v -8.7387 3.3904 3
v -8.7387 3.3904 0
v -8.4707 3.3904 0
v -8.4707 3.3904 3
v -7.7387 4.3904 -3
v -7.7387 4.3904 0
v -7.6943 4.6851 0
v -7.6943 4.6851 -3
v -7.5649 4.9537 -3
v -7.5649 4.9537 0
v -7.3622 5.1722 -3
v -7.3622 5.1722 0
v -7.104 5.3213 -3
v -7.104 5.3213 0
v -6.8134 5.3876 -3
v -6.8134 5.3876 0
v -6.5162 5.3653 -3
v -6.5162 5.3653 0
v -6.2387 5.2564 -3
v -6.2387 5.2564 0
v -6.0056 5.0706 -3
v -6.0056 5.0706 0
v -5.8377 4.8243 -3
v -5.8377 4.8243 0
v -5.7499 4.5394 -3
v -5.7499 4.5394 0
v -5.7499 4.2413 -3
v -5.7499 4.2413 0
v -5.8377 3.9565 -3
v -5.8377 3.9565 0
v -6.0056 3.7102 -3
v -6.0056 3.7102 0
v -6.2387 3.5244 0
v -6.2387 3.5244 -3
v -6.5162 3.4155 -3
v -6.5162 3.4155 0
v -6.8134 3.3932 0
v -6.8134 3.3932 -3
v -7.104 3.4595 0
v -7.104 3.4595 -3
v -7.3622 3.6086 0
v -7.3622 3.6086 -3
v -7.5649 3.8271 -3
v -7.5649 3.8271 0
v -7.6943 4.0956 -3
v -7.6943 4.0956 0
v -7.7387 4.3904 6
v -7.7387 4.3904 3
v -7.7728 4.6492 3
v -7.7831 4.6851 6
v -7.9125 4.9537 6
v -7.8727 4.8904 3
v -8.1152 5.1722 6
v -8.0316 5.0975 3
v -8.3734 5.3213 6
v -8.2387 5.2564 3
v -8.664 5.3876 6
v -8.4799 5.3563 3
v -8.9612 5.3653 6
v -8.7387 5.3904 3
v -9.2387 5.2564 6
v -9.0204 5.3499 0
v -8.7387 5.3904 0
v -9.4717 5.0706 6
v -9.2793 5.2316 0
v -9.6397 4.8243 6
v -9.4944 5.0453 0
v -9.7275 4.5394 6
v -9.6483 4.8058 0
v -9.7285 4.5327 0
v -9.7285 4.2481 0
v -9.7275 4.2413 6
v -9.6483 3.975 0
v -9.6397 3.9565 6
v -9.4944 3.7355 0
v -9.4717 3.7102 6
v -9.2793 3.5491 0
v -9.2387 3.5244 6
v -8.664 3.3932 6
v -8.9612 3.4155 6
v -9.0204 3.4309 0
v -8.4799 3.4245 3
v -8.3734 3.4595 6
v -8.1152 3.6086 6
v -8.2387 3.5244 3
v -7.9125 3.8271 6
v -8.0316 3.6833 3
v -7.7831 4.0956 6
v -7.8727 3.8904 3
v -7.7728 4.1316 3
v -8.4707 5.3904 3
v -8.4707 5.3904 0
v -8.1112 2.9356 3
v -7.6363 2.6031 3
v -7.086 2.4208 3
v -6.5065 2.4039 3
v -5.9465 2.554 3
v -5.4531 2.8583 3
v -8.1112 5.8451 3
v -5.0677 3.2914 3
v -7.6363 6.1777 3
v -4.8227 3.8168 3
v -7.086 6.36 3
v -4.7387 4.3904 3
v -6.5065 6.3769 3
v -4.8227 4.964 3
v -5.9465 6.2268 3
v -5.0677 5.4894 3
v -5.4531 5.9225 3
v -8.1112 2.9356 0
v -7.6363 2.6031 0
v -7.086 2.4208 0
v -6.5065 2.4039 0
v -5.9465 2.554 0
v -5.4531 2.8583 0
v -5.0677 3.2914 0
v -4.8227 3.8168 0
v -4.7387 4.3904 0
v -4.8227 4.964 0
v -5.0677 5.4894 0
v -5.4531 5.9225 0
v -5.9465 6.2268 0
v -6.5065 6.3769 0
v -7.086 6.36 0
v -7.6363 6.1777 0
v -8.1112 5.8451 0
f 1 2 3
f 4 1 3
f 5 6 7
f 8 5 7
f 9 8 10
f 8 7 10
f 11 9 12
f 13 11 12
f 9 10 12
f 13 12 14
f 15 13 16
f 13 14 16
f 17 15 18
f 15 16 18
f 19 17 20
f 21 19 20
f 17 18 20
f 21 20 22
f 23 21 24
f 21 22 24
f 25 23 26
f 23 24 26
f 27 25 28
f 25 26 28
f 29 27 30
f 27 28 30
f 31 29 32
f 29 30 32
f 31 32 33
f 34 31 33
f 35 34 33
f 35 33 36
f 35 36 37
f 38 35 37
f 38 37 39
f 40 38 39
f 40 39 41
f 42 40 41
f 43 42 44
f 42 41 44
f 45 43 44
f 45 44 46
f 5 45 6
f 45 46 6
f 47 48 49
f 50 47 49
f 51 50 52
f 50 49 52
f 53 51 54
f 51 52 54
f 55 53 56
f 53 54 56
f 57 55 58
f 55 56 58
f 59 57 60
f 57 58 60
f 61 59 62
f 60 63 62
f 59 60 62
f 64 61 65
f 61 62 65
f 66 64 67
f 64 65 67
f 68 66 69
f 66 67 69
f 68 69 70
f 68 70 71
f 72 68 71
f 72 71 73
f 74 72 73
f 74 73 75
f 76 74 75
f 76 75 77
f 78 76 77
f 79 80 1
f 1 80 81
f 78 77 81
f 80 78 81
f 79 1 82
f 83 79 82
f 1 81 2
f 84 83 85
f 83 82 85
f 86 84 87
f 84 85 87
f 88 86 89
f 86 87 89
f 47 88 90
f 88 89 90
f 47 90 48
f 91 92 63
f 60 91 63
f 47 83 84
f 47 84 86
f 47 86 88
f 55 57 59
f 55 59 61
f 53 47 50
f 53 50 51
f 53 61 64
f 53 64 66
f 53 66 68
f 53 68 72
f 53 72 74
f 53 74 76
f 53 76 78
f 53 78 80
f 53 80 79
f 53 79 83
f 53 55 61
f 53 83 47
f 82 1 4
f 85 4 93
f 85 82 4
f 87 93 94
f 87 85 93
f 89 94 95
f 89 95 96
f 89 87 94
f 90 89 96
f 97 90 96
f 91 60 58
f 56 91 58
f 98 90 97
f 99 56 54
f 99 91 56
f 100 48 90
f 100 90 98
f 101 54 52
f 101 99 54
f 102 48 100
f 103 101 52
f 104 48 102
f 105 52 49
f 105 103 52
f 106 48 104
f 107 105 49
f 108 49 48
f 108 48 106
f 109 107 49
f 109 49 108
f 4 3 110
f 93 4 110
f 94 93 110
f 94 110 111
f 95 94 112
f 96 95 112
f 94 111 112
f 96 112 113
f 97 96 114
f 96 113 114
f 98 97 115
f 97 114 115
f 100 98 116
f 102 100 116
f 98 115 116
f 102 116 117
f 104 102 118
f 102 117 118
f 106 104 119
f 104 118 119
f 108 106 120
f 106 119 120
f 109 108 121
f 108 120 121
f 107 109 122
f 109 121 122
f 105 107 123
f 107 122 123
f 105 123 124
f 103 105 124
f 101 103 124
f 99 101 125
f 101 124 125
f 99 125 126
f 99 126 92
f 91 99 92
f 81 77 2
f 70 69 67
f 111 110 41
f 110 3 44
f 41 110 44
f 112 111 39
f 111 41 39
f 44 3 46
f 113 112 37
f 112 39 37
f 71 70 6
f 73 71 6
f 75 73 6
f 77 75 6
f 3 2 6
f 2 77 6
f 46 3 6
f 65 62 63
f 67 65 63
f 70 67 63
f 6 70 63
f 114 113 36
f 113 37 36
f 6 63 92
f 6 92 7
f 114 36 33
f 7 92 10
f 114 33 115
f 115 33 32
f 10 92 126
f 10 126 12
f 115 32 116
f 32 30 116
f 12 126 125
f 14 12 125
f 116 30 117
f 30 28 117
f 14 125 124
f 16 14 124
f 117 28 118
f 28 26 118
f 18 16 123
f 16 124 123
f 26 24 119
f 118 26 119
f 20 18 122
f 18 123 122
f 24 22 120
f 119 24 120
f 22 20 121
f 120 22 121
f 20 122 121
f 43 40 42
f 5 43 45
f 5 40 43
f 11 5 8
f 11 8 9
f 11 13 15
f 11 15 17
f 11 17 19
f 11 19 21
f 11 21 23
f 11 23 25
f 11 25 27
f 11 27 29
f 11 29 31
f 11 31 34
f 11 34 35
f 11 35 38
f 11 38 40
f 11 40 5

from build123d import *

# Parameters (mm, degrees)
BOSS_EXTRUDE1_DEPTH = 3
SKETCH2_R           = 1
BOSS_EXTRUDE2_DEPTH = 3
SKETCH3_R           = 1
BOSS_EXTRUDE3_DEPTH = 3


with BuildPart() as part:
    # Sketch1 → Boss-Extrude1 (new body)
    with BuildSketch(Plane.XY):
        with BuildLine():
            ThreePointArc((-8.738694844, 5.390391994), (-9.738694844, 4.390391994), (-8.738694844, 3.390391994))
            Line((-8.738694844, 3.390391994), (-8.470745652, 3.390391994))
            ThreePointArc((-8.470745652, 3.390391994), (-4.738694844, 4.390391994), (-8.470745652, 5.390391994))
            Line((-8.470745652, 5.390391994), (-8.738694844, 5.390391994))
        make_face()
    extrude(amount=BOSS_EXTRUDE1_DEPTH)

    # Sketch2 → Boss-Extrude2 (add)
    with BuildSketch(Plane.XY.offset(3)):
        with Locations((-8.738694844, 4.390391994)):
            Circle(SKETCH2_R)
    extrude(amount=BOSS_EXTRUDE2_DEPTH)

    # Sketch3 → Boss-Extrude3 (add)
    with BuildSketch(Plane(origin=(0, 0, 0), x_dir=(-1, 0, 0), z_dir=(0, 0, -1))):
        with Locations((6.738694844, 4.390391994)):
            Circle(SKETCH3_R)
    extrude(amount=BOSS_EXTRUDE3_DEPTH)


solid = part.part
